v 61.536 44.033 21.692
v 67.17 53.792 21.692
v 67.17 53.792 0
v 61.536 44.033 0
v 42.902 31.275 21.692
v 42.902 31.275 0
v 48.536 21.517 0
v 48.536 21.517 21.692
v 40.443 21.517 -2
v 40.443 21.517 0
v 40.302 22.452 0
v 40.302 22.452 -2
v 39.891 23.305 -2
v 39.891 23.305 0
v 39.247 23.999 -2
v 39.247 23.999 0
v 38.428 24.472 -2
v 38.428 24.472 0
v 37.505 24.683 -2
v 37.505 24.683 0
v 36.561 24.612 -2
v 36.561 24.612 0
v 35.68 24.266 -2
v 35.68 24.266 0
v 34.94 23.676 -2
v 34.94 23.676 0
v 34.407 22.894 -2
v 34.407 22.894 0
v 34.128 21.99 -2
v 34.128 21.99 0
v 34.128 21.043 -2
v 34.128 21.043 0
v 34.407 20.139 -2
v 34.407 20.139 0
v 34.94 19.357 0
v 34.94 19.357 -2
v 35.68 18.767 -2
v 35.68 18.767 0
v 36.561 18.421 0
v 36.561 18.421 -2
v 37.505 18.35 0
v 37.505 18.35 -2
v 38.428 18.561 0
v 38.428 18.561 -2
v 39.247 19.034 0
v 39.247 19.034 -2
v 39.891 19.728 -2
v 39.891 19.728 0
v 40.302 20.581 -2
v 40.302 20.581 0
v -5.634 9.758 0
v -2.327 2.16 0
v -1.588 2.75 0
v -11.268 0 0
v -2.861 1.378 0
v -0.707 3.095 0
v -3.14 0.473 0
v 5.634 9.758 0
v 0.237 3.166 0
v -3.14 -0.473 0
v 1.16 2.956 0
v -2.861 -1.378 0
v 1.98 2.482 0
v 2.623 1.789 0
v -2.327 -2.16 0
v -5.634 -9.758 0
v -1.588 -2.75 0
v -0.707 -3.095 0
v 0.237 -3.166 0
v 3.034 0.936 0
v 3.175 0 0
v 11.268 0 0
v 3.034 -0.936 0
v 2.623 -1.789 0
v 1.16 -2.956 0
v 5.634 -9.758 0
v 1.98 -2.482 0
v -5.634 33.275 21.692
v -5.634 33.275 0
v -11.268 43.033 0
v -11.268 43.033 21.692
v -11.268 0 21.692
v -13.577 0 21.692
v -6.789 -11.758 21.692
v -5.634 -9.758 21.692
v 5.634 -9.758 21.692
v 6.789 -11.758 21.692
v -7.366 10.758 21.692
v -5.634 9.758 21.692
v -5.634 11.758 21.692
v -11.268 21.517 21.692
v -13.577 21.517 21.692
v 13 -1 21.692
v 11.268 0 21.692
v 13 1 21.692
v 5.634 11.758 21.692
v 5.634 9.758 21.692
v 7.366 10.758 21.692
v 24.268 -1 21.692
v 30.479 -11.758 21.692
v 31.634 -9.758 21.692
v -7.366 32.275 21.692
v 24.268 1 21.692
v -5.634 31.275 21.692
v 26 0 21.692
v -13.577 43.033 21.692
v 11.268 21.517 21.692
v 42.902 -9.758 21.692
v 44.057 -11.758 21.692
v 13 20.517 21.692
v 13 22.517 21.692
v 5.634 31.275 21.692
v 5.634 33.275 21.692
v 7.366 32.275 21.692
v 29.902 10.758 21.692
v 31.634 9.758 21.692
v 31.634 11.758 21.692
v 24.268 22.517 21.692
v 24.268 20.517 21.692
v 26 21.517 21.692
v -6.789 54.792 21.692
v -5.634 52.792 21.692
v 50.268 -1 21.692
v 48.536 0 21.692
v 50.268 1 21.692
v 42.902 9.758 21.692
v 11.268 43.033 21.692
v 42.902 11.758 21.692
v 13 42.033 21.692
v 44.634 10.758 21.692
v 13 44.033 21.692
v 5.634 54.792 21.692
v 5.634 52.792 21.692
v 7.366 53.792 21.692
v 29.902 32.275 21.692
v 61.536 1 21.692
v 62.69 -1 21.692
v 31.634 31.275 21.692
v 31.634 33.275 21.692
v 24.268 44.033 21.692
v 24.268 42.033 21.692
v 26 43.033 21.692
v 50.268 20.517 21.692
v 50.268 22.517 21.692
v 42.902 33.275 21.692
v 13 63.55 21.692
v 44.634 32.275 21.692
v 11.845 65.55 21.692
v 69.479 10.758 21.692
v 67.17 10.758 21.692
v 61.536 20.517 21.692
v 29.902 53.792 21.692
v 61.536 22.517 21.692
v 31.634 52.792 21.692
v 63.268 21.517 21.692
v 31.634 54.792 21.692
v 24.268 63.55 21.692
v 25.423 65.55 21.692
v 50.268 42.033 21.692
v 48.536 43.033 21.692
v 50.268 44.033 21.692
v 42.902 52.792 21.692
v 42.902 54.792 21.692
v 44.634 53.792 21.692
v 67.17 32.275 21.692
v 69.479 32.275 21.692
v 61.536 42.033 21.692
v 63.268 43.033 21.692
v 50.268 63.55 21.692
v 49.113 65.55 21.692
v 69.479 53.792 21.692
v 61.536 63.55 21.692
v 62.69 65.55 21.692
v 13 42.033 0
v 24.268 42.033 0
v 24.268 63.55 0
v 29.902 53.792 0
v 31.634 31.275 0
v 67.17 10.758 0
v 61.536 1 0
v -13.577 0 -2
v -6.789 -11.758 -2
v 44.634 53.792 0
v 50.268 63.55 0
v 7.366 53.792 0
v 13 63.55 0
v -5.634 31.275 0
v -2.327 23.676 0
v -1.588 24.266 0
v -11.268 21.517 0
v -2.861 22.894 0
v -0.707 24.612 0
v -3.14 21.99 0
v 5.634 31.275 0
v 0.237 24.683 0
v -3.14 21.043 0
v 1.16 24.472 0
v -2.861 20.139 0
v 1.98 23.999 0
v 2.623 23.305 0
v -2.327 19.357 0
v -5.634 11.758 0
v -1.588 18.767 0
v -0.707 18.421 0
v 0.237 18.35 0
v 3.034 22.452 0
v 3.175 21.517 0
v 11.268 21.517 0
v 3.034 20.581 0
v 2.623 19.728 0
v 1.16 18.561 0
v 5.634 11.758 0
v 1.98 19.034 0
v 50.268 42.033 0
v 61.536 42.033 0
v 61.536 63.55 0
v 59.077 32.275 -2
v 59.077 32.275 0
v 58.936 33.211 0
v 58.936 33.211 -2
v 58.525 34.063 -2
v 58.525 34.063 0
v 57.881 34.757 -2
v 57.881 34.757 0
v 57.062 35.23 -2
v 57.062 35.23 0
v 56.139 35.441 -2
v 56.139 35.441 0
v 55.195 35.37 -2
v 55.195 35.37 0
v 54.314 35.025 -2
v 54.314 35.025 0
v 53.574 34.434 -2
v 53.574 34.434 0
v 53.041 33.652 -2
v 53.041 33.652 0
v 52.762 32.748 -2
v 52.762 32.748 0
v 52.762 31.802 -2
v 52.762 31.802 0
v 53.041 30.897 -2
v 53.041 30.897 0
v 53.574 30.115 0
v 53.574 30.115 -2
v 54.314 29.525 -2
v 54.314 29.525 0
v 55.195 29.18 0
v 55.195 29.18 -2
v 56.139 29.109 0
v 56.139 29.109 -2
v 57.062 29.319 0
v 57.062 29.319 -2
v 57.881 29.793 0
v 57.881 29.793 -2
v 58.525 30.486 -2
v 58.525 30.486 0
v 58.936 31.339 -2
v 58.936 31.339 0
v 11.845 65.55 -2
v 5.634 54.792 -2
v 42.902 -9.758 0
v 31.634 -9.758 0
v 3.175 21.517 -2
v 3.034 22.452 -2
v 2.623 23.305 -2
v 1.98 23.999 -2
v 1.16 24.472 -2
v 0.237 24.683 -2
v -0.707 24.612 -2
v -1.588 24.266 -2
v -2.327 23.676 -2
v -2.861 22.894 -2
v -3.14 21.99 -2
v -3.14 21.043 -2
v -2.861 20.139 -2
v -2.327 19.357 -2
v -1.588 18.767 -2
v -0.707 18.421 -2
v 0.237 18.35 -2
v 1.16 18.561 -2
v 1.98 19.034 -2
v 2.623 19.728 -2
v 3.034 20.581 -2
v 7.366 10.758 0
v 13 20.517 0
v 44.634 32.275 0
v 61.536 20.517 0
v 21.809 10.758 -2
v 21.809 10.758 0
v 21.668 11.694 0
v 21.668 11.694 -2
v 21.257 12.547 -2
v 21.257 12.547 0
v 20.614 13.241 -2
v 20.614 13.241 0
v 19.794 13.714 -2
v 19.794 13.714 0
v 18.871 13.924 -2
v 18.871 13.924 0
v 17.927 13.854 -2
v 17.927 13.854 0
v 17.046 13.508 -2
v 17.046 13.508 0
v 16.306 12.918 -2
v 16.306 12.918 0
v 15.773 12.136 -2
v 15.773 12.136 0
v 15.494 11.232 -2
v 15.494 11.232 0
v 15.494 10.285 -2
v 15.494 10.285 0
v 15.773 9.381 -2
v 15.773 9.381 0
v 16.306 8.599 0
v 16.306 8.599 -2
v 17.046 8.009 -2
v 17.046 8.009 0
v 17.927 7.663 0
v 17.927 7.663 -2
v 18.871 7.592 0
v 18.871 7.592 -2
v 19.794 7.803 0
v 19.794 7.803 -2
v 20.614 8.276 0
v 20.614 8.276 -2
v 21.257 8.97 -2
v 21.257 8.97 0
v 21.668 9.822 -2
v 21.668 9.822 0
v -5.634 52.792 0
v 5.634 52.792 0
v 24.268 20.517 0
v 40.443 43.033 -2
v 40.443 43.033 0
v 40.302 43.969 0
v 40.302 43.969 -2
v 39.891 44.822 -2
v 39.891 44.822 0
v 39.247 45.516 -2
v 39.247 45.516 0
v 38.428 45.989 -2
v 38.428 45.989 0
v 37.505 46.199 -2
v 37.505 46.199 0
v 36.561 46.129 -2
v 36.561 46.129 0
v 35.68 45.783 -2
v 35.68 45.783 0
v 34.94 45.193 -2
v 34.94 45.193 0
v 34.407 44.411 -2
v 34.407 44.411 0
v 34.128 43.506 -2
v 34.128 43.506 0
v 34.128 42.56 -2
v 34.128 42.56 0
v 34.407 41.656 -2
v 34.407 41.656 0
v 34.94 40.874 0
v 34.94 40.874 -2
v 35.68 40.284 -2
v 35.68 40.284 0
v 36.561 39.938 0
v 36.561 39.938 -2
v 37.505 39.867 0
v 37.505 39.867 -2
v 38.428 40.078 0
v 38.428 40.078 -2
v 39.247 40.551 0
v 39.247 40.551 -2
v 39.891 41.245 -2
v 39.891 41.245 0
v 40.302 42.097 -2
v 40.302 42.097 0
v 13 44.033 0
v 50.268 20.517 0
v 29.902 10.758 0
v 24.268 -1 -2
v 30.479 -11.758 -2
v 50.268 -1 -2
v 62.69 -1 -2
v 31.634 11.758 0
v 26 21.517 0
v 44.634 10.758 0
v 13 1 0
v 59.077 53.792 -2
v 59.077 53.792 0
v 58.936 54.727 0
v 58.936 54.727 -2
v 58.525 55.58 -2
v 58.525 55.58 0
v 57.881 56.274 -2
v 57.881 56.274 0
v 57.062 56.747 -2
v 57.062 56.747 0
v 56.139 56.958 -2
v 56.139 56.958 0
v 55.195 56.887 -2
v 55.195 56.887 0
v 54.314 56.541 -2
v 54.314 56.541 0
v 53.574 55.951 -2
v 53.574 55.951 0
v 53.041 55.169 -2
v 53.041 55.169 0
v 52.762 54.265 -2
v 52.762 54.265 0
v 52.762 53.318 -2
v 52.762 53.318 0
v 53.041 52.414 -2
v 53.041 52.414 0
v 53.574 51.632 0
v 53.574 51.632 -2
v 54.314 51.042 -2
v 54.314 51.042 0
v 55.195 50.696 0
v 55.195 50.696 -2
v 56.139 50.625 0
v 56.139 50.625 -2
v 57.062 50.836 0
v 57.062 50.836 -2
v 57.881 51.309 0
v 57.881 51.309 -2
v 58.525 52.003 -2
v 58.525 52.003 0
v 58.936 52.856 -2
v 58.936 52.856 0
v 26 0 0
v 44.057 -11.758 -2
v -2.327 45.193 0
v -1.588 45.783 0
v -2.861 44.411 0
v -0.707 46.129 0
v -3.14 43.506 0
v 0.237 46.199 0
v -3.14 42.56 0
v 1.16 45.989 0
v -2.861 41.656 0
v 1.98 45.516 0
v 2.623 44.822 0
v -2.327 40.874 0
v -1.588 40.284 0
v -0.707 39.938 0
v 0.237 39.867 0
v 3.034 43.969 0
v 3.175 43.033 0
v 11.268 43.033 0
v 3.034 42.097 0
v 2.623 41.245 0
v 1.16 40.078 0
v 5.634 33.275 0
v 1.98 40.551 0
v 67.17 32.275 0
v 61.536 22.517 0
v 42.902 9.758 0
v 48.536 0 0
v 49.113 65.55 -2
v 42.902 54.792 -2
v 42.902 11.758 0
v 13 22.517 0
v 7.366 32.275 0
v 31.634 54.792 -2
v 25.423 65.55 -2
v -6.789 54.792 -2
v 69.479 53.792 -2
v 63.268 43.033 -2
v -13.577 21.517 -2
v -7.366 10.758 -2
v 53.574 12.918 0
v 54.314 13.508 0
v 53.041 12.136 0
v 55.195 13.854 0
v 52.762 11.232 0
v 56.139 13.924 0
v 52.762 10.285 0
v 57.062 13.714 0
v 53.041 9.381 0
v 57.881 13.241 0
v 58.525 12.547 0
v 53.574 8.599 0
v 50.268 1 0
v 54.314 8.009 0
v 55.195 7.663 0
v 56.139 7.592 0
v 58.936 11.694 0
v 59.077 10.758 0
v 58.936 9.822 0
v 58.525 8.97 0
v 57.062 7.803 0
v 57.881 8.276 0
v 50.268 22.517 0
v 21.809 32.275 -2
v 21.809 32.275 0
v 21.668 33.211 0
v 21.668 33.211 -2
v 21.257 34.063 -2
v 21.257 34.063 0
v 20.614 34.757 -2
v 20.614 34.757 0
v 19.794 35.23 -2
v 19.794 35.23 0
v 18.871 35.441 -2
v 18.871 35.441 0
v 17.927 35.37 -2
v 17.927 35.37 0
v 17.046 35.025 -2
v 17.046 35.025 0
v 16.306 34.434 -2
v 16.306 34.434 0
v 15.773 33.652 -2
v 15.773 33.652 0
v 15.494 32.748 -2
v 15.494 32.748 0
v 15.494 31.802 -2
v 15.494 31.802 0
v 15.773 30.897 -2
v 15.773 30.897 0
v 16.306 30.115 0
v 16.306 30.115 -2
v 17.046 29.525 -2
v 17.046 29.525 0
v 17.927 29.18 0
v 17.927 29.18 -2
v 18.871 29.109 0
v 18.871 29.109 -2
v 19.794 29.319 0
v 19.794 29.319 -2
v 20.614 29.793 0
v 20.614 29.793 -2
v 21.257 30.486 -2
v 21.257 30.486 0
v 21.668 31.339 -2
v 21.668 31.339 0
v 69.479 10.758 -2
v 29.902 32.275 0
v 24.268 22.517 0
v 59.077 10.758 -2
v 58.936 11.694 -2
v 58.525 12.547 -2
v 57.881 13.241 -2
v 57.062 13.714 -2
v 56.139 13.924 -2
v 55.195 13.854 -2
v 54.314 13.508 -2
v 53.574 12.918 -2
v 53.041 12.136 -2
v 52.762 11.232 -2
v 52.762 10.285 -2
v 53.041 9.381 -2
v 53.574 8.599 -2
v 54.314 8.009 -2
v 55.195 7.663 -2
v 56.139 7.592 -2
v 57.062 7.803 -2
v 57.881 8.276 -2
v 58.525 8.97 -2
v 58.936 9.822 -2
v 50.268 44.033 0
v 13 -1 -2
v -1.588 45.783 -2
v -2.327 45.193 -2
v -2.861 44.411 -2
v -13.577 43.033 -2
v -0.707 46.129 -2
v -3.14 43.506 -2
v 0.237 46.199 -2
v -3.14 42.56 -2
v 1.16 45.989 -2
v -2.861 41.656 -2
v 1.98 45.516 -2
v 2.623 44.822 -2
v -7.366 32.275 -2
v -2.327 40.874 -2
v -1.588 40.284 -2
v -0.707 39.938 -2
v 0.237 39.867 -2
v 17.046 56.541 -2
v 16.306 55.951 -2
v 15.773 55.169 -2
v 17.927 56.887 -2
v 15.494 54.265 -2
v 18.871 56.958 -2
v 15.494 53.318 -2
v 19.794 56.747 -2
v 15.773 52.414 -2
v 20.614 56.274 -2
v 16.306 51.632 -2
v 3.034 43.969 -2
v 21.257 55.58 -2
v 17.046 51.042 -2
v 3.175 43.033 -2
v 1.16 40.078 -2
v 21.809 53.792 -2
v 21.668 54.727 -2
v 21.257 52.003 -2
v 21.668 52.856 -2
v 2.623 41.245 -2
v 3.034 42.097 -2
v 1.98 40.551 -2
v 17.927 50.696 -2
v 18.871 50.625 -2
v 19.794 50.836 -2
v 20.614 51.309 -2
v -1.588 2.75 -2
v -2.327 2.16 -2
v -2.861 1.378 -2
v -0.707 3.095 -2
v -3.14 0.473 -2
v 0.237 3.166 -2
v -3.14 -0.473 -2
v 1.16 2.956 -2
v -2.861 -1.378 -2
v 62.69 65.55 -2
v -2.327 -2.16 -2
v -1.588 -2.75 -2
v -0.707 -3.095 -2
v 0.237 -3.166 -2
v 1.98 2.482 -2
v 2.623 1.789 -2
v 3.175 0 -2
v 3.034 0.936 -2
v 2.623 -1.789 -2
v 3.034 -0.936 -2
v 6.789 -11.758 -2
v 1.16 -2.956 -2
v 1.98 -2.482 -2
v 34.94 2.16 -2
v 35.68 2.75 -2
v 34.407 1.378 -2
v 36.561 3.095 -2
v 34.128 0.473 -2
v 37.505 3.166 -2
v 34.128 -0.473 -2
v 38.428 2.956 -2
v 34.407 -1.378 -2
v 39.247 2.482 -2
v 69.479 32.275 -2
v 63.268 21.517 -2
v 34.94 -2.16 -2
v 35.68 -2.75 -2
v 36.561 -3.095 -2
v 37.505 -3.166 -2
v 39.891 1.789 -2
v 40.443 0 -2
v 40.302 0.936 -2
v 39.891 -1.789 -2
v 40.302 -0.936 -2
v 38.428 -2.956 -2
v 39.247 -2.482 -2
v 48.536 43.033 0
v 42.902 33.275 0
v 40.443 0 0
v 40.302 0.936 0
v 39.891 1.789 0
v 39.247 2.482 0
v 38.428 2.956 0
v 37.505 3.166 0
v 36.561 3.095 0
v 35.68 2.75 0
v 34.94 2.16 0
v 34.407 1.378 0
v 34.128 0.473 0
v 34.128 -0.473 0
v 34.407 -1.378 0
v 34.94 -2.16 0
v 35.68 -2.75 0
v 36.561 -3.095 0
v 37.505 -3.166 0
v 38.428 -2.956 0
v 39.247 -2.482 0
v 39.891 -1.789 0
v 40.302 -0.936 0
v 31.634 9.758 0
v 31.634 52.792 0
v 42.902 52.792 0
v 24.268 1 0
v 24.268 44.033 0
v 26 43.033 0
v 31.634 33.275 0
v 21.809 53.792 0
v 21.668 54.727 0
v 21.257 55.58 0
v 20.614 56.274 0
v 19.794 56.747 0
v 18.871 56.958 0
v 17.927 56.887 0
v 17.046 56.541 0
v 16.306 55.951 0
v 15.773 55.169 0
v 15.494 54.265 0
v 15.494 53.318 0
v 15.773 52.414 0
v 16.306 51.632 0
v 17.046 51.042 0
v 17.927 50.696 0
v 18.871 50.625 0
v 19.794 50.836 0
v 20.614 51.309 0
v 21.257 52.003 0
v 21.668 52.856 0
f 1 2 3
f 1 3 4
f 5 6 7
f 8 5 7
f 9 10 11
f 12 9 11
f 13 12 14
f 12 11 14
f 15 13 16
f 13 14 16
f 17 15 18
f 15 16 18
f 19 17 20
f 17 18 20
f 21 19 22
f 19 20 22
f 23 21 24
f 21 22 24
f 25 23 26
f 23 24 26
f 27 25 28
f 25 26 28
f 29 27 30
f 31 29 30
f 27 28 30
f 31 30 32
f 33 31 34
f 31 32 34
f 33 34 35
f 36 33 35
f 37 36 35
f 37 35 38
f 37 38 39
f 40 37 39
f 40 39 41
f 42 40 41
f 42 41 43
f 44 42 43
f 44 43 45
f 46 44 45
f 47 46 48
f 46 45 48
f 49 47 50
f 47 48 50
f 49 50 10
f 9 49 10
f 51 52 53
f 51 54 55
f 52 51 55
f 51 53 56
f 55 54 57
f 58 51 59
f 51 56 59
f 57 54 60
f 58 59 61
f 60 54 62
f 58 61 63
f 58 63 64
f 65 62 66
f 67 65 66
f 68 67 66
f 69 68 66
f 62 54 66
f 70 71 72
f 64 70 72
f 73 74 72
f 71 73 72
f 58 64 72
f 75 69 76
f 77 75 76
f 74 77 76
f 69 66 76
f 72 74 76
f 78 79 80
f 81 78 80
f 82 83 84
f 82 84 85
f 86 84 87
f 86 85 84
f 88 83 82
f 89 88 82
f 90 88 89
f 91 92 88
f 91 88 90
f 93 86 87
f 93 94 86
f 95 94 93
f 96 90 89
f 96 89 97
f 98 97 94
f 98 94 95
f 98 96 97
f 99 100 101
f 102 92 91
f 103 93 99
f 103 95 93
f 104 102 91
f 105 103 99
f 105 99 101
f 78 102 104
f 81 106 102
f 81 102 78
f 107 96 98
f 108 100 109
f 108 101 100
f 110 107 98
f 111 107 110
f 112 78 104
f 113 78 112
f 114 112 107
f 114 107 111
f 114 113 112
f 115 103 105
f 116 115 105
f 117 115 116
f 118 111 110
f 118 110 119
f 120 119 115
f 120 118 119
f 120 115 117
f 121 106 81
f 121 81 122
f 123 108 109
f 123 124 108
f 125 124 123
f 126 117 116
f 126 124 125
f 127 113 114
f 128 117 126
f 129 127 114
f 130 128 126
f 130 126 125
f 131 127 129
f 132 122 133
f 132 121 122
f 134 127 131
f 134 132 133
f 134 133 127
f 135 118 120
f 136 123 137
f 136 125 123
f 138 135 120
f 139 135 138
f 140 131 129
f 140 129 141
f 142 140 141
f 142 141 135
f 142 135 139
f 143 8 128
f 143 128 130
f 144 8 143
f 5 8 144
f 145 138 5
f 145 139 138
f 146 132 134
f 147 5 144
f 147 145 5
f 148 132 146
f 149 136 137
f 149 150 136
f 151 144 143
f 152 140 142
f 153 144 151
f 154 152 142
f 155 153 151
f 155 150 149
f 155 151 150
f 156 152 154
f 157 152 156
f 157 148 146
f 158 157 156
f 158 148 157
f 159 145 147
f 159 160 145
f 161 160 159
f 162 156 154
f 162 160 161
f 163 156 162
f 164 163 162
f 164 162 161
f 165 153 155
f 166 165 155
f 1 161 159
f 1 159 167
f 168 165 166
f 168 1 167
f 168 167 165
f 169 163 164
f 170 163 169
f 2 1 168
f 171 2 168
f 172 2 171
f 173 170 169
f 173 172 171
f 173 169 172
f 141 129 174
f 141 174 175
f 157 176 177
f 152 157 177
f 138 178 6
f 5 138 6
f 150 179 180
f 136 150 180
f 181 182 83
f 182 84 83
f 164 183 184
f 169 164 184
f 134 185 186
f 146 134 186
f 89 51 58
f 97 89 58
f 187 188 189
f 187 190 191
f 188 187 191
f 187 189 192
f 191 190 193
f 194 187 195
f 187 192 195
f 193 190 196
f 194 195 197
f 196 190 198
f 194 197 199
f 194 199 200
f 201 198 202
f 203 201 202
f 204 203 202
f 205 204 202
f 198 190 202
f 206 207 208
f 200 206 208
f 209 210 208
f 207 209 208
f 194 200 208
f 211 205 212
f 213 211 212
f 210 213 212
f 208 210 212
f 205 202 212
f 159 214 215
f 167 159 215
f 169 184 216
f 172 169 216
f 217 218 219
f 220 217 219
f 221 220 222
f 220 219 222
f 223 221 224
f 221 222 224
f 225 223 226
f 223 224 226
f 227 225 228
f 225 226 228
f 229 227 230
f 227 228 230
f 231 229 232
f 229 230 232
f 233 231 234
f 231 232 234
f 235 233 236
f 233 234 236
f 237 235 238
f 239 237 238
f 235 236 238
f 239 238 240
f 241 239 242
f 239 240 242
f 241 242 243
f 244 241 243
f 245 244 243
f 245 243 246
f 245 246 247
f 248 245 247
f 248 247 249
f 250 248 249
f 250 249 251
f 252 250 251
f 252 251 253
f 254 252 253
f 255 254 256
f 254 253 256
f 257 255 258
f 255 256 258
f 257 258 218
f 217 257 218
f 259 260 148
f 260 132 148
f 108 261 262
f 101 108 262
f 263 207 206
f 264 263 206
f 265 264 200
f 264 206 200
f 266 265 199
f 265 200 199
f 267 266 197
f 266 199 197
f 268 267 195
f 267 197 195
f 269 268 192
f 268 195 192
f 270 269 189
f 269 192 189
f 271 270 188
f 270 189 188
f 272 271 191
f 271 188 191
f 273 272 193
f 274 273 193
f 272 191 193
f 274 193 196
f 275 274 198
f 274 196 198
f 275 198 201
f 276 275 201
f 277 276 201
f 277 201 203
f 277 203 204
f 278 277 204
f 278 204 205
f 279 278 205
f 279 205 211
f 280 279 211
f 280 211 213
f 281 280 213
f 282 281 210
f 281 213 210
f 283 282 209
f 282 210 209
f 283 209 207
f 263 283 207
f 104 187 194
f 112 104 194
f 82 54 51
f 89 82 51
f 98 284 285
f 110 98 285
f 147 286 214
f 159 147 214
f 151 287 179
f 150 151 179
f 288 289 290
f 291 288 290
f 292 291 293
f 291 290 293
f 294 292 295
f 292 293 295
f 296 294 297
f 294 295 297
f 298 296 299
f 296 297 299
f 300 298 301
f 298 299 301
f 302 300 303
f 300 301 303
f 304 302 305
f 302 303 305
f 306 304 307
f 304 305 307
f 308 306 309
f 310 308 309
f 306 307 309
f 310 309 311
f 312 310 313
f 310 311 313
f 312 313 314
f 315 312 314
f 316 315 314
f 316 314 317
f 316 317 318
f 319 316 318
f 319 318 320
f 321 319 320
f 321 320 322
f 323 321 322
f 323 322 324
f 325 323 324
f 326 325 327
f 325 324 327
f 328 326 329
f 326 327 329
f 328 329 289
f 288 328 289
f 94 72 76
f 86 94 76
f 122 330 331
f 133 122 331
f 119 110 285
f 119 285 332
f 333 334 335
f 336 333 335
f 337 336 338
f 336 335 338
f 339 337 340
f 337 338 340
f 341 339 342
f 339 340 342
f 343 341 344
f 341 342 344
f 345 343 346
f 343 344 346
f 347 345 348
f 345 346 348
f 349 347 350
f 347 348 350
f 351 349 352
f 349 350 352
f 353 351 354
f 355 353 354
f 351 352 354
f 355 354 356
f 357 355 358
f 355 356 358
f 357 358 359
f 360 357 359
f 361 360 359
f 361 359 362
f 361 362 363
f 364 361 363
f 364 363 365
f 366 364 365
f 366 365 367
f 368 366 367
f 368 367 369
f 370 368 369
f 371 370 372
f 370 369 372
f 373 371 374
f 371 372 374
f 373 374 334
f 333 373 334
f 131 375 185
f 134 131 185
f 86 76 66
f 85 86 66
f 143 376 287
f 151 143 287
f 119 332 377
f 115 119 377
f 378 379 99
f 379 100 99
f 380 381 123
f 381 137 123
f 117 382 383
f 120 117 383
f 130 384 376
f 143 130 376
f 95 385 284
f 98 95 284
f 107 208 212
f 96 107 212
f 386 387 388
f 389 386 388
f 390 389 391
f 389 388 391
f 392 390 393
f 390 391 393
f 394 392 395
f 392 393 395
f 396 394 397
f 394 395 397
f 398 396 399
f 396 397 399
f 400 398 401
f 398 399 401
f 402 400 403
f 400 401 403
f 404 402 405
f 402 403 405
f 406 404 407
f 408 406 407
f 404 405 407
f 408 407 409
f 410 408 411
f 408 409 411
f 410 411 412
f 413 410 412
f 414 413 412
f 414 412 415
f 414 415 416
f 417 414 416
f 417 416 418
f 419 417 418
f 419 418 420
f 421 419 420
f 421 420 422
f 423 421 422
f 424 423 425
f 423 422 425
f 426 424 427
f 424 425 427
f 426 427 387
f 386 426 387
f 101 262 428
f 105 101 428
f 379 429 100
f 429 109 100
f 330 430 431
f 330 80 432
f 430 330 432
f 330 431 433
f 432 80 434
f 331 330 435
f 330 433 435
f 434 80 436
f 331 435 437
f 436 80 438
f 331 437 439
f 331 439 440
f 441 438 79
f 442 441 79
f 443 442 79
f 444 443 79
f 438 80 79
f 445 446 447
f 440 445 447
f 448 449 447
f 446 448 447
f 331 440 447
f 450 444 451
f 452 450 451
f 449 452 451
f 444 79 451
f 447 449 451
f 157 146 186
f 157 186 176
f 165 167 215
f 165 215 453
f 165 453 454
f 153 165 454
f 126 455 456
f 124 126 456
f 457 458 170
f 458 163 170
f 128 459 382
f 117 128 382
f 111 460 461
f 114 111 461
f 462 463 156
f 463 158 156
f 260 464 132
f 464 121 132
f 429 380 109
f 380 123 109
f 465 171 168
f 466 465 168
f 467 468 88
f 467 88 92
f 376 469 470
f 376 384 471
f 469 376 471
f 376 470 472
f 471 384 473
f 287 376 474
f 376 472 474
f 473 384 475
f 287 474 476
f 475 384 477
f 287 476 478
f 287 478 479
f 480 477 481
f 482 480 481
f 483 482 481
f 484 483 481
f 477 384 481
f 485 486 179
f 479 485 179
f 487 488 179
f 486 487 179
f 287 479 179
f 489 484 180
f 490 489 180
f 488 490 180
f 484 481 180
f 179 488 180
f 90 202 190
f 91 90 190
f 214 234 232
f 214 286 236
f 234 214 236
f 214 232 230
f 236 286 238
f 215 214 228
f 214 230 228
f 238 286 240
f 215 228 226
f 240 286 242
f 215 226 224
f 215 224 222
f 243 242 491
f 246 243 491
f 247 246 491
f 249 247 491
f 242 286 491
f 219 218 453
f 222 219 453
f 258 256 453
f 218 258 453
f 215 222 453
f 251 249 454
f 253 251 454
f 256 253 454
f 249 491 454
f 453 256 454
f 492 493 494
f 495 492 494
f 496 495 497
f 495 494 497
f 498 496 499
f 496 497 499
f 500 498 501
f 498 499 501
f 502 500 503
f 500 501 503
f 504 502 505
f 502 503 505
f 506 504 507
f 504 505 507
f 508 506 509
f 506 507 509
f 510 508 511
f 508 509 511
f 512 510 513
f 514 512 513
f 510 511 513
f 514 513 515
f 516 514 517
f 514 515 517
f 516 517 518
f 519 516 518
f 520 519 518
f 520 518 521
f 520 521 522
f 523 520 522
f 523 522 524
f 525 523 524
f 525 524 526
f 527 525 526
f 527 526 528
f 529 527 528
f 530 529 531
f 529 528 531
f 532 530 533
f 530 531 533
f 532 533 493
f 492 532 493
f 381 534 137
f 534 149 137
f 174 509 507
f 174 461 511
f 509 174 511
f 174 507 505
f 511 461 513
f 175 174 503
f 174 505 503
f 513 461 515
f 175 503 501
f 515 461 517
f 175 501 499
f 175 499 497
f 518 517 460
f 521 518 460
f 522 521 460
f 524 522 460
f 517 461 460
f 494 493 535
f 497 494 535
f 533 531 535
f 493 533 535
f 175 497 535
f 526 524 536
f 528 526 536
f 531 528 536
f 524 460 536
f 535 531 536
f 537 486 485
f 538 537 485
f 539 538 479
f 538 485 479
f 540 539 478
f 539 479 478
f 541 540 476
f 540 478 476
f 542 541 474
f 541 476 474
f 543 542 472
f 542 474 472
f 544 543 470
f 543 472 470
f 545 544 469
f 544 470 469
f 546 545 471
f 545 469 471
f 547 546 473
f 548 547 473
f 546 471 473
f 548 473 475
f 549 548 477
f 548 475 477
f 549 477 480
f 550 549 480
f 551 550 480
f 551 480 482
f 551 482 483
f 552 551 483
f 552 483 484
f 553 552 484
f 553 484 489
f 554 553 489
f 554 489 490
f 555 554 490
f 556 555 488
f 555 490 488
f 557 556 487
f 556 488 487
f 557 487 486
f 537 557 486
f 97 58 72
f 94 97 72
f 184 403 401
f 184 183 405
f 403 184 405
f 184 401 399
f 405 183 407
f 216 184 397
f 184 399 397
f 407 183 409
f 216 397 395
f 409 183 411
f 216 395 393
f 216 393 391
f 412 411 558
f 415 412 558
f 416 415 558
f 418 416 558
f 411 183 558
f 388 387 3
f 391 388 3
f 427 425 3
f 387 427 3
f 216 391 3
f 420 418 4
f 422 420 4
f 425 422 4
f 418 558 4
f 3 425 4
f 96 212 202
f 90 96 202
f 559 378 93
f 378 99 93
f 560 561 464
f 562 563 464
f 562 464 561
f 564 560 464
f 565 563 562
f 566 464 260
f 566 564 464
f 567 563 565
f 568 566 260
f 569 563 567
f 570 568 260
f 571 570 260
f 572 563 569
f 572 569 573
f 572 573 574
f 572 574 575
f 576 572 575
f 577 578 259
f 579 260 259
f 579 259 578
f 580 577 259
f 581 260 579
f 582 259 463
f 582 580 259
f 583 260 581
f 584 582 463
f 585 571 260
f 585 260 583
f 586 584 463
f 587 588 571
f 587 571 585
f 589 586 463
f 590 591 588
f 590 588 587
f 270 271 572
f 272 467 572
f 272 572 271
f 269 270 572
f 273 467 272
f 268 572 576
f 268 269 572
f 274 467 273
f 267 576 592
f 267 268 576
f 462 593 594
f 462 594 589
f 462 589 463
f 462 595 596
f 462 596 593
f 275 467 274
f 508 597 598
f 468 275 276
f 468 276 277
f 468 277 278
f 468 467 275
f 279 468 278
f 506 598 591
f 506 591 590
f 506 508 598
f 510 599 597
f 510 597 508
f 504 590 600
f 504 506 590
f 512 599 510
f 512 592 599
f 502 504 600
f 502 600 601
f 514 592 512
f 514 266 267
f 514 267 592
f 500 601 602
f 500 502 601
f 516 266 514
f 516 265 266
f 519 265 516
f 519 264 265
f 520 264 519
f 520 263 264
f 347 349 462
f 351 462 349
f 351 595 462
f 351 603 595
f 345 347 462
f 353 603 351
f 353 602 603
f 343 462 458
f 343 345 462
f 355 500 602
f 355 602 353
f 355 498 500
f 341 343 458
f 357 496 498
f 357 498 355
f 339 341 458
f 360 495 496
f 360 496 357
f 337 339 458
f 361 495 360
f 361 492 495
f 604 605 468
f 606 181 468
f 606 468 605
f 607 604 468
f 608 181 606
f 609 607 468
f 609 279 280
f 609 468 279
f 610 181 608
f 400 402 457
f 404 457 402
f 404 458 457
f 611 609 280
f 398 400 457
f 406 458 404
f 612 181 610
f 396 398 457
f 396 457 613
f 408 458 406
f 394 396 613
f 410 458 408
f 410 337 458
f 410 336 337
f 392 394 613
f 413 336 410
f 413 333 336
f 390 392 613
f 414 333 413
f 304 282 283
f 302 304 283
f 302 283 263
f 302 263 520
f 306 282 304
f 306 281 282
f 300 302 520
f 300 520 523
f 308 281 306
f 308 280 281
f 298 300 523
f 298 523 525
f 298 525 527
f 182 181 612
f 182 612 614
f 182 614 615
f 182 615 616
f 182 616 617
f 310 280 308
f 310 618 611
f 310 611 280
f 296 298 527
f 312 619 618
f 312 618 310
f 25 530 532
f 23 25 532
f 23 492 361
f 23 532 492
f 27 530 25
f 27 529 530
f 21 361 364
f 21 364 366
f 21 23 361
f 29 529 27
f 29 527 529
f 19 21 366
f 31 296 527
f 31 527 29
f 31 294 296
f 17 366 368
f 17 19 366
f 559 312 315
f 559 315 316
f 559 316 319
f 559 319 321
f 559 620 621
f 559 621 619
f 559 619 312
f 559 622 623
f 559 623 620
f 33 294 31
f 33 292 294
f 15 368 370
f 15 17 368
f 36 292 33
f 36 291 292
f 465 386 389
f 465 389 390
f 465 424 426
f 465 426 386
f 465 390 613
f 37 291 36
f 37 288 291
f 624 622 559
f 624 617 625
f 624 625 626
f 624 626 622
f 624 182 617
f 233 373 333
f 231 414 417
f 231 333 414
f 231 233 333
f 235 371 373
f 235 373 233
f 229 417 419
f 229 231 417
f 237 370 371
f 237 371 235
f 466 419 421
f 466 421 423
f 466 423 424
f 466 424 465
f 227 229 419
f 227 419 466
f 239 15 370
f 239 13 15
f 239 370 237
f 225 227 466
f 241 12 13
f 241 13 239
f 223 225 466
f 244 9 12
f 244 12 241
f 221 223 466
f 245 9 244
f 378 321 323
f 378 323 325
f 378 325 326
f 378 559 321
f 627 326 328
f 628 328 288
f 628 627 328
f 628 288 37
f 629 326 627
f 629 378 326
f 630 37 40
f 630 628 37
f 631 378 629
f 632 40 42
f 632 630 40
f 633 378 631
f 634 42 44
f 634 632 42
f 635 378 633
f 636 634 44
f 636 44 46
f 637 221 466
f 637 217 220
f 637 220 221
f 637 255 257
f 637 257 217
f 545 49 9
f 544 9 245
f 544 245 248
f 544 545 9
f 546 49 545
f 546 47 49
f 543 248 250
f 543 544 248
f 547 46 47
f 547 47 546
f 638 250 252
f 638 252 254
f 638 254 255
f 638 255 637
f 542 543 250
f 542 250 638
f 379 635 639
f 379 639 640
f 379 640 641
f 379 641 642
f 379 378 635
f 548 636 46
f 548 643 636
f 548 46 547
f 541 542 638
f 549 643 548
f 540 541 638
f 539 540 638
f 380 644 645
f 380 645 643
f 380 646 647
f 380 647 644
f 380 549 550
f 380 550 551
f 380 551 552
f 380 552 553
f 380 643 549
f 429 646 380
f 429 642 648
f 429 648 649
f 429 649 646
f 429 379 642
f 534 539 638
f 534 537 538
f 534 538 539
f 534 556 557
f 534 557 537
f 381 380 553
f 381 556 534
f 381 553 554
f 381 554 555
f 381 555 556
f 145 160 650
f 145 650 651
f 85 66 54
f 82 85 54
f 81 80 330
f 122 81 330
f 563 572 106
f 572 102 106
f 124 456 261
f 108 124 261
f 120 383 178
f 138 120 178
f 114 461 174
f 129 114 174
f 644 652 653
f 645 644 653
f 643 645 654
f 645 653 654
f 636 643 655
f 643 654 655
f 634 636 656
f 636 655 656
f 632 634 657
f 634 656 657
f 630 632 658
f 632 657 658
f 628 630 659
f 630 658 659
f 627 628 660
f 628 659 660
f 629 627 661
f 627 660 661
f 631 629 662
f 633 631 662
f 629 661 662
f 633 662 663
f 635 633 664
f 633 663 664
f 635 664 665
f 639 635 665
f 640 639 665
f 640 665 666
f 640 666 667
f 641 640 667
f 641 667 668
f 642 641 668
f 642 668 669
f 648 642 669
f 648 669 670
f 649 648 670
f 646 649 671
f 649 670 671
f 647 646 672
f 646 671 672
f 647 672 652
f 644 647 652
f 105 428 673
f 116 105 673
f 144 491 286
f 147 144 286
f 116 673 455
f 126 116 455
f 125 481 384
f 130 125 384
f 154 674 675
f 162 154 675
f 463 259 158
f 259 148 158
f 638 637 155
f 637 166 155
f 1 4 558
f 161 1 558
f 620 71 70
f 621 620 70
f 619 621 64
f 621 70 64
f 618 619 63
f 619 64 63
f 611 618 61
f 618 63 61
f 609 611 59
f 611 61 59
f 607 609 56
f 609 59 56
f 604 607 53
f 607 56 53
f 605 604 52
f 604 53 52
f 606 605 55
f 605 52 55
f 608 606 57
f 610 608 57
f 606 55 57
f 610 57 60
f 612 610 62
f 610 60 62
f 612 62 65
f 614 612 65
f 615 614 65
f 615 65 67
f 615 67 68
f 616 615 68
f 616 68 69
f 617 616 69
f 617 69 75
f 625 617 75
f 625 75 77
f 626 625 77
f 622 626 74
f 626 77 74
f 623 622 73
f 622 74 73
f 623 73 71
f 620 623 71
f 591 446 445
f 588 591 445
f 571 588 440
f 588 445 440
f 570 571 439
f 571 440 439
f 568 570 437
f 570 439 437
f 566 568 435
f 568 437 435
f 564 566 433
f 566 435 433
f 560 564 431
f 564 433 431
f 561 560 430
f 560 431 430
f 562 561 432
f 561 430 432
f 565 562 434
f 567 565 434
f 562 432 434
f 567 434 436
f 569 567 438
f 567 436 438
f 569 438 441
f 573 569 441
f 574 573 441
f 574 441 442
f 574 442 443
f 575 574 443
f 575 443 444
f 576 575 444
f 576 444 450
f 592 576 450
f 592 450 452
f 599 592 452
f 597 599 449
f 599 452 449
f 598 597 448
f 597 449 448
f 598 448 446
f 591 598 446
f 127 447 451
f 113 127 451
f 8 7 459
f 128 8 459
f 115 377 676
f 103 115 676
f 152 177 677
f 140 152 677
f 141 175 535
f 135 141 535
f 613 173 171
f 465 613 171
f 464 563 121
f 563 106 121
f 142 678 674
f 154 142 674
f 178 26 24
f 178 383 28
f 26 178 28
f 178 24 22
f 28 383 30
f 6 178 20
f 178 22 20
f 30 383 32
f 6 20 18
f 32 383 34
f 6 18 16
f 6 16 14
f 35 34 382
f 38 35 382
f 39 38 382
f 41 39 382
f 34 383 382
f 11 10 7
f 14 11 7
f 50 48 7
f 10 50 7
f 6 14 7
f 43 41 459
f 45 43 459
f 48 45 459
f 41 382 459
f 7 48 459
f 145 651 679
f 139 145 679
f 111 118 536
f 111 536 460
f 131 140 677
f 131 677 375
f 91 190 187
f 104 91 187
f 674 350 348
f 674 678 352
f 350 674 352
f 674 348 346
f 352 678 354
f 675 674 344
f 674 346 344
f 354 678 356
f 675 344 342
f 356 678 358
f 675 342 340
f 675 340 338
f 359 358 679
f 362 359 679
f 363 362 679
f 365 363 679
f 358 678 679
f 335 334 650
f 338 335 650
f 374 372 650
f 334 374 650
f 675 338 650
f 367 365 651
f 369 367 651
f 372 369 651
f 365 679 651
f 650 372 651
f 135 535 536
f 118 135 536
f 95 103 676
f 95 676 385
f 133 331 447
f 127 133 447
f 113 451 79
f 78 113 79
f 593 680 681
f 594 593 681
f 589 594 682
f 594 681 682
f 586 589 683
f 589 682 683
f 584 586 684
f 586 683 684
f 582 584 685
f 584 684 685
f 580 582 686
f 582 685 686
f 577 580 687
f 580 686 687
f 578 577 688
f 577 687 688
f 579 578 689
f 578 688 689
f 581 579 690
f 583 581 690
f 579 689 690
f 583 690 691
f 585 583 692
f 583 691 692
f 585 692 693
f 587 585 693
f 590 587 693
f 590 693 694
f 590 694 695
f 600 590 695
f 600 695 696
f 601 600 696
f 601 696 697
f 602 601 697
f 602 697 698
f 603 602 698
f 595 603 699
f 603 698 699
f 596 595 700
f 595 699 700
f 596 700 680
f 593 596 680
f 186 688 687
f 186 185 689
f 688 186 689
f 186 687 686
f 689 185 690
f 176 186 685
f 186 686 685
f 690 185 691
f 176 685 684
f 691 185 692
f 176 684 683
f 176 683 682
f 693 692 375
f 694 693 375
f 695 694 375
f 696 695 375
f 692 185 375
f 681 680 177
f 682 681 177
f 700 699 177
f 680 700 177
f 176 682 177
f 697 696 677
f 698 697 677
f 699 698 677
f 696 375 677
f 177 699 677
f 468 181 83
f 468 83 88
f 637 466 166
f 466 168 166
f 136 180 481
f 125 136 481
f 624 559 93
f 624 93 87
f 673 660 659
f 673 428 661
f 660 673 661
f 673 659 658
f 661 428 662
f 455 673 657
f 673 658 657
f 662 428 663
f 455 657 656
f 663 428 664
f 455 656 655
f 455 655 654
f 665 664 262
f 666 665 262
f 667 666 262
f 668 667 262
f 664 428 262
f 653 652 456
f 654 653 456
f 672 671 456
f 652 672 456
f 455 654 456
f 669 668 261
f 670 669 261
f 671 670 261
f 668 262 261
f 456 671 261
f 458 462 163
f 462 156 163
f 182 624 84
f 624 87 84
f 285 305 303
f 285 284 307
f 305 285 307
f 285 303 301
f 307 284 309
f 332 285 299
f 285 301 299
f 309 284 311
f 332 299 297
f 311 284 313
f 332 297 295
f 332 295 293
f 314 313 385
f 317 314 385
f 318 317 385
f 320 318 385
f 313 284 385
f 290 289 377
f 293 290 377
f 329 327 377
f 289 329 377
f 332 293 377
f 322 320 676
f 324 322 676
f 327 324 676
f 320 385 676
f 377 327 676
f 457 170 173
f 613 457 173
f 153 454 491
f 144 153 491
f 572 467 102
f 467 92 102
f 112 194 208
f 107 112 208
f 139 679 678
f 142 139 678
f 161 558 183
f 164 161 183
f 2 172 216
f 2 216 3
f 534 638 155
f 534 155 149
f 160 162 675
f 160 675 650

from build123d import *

# Parameters (mm, degrees)
F1_DEPTH = 21.6916
F3_DEPTH = 2
F0_R     = 3.175
F4_DEPTH = 2


with BuildPart() as f1:
    # F0 (on Top) → F1 (new body)
    with BuildSketch(Plane.XY):
        Polygon((-7.366008, 32.2749), (-13.577315, 21.5166), (-7.366008, 10.7583), (-13.577315, 0), (-6.788658, -11.7583), (6.788658, -11.7583), (12.999965, -1), (24.267879, -1), (30.479187, -11.7583), (44.056502, -11.7583), (50.267809, -1), (62.690424, -1), (69.479082, 10.7583), (63.267775, 21.5166), (69.479082, 32.2749), (63.267775, 43.0332), (69.479082, 53.7915), (62.690424, 65.5498), (49.113109, 65.5498), (42.901802, 54.7915), (31.633887, 54.7915), (25.42258, 65.5498), (11.845265, 65.5498), (5.633957, 54.7915), (-6.788658, 54.7915), (-13.577315, 43.0332), align=None)
        Polygon((-5.633957, 9.7583), (5.633957, 9.7583), (11.267914, 0), (5.633957, -9.7583), (-5.633957, -9.7583), (-11.267914, 0), align=None, mode=Mode.SUBTRACT)
        Polygon((11.267914, 21.5166), (5.633957, 11.7583), (-5.633957, 11.7583), (-11.267914, 21.5166), (-5.633957, 31.2749), (5.633957, 31.2749), align=None, mode=Mode.SUBTRACT)
        Polygon((12.999965, 20.5166), (24.267879, 20.5166), (29.901836, 10.7583), (24.267879, 1), (12.999965, 1), (7.366008, 10.7583), align=None, mode=Mode.SUBTRACT)
        Polygon((48.535759, 0), (42.901802, -9.7583), (31.633887, -9.7583), (25.99993, 0), (31.633887, 9.7583), (42.901802, 9.7583), align=None, mode=Mode.SUBTRACT)
        Polygon((25.99993, 21.5166), (31.633887, 31.2749), (42.901802, 31.2749), (48.535759, 21.5166), (42.901802, 11.7583), (31.633887, 11.7583), align=None, mode=Mode.SUBTRACT)
        Polygon((61.535724, 1), (50.267809, 1), (44.633852, 10.7583), (50.267809, 20.5166), (61.535724, 20.5166), (67.169681, 10.7583), align=None, mode=Mode.SUBTRACT)
        Polygon((11.267914, 43.0332), (5.633957, 33.2749), (-5.633957, 33.2749), (-11.267914, 43.0332), (-5.633957, 52.7915), (5.633957, 52.7915), align=None, mode=Mode.SUBTRACT)
        Polygon((24.267879, 22.5166), (12.999965, 22.5166), (7.366008, 32.2749), (12.999965, 42.0332), (24.267879, 42.0332), (29.901836, 32.2749), align=None, mode=Mode.SUBTRACT)
        Polygon((24.267879, 44.0332), (12.999965, 44.0332), (7.366008, 53.7915), (12.999965, 63.5498), (24.267879, 63.5498), (29.901836, 53.7915), align=None, mode=Mode.SUBTRACT)
        Polygon((25.99993, 43.0332), (31.633887, 52.7915), (42.901802, 52.7915), (48.535759, 43.0332), (42.901802, 33.2749), (31.633887, 33.2749), align=None, mode=Mode.SUBTRACT)
        Polygon((67.169681, 32.2749), (61.535724, 22.5166), (50.267809, 22.5166), (44.633852, 32.2749), (50.267809, 42.0332), (61.535724, 42.0332), align=None, mode=Mode.SUBTRACT)
        Polygon((50.267809, 63.5498), (61.535724, 63.5498), (67.169681, 53.7915), (61.535724, 44.0332), (50.267809, 44.0332), (44.633852, 53.7915), align=None, mode=Mode.SUBTRACT)
    extrude(amount=F1_DEPTH)

    # F2 (on face) → F3 (join)
    with BuildSketch(Plane(origin=(0, 0, 0), x_dir=(1, 0, 0), z_dir=(0, 0, -1))):
        Polygon((69.479082, -53.7915), (63.267775, -43.0332), (69.479082, -32.2749), (63.267775, -21.5166), (69.479082, -10.7583), (62.690424, 1), (50.267809, 1), (44.056502, 11.7583), (30.479187, 11.7583), (24.267879, 1), (12.999965, 1), (6.788658, 11.7583), (-6.788658, 11.7583), (-13.577315, 0), (-7.366008, -10.7583), (-13.577315, -21.5166), (-7.366008, -32.2749), (-13.577315, -43.0332), (-6.788658, -54.7915), (5.633957, -54.7915), (11.845265, -65.5498), (25.42258, -65.5498), (31.633887, -54.7915), (42.901802, -54.7915), (49.113109, -65.5498), (62.690424, -65.5498), align=None)
    extrude(amount=F3_DEPTH)

    # F0 (on Top) → F4 (cut, through all)
    with BuildSketch(Plane.XY):
        with Locations((0, 43.0332)):
            Circle(F0_R)
        with Locations((18.633922, 53.7915)):
            Circle(F0_R)
        with Locations((37.267844, 43.0332)):
            Circle(F0_R)
        with Locations((55.901767, 53.7915)):
            Circle(F0_R)
        with Locations((55.901767, 32.2749)):
            Circle(F0_R)
        with Locations((37.267844, 21.5166)):
            Circle(F0_R)
        with Locations((18.633922, 32.2749)):
            Circle(F0_R)
        with Locations((0, 21.5166)):
            Circle(F0_R)
        Circle(F0_R)
        with Locations((18.633922, 10.7583)):
            Circle(F0_R)
        with Locations((37.267844, 0)):
            Circle(F0_R)
        with Locations((55.901767, 10.7583)):
            Circle(F0_R)
    extrude(amount=-F4_DEPTH, mode=Mode.SUBTRACT)


solid = f1.part
